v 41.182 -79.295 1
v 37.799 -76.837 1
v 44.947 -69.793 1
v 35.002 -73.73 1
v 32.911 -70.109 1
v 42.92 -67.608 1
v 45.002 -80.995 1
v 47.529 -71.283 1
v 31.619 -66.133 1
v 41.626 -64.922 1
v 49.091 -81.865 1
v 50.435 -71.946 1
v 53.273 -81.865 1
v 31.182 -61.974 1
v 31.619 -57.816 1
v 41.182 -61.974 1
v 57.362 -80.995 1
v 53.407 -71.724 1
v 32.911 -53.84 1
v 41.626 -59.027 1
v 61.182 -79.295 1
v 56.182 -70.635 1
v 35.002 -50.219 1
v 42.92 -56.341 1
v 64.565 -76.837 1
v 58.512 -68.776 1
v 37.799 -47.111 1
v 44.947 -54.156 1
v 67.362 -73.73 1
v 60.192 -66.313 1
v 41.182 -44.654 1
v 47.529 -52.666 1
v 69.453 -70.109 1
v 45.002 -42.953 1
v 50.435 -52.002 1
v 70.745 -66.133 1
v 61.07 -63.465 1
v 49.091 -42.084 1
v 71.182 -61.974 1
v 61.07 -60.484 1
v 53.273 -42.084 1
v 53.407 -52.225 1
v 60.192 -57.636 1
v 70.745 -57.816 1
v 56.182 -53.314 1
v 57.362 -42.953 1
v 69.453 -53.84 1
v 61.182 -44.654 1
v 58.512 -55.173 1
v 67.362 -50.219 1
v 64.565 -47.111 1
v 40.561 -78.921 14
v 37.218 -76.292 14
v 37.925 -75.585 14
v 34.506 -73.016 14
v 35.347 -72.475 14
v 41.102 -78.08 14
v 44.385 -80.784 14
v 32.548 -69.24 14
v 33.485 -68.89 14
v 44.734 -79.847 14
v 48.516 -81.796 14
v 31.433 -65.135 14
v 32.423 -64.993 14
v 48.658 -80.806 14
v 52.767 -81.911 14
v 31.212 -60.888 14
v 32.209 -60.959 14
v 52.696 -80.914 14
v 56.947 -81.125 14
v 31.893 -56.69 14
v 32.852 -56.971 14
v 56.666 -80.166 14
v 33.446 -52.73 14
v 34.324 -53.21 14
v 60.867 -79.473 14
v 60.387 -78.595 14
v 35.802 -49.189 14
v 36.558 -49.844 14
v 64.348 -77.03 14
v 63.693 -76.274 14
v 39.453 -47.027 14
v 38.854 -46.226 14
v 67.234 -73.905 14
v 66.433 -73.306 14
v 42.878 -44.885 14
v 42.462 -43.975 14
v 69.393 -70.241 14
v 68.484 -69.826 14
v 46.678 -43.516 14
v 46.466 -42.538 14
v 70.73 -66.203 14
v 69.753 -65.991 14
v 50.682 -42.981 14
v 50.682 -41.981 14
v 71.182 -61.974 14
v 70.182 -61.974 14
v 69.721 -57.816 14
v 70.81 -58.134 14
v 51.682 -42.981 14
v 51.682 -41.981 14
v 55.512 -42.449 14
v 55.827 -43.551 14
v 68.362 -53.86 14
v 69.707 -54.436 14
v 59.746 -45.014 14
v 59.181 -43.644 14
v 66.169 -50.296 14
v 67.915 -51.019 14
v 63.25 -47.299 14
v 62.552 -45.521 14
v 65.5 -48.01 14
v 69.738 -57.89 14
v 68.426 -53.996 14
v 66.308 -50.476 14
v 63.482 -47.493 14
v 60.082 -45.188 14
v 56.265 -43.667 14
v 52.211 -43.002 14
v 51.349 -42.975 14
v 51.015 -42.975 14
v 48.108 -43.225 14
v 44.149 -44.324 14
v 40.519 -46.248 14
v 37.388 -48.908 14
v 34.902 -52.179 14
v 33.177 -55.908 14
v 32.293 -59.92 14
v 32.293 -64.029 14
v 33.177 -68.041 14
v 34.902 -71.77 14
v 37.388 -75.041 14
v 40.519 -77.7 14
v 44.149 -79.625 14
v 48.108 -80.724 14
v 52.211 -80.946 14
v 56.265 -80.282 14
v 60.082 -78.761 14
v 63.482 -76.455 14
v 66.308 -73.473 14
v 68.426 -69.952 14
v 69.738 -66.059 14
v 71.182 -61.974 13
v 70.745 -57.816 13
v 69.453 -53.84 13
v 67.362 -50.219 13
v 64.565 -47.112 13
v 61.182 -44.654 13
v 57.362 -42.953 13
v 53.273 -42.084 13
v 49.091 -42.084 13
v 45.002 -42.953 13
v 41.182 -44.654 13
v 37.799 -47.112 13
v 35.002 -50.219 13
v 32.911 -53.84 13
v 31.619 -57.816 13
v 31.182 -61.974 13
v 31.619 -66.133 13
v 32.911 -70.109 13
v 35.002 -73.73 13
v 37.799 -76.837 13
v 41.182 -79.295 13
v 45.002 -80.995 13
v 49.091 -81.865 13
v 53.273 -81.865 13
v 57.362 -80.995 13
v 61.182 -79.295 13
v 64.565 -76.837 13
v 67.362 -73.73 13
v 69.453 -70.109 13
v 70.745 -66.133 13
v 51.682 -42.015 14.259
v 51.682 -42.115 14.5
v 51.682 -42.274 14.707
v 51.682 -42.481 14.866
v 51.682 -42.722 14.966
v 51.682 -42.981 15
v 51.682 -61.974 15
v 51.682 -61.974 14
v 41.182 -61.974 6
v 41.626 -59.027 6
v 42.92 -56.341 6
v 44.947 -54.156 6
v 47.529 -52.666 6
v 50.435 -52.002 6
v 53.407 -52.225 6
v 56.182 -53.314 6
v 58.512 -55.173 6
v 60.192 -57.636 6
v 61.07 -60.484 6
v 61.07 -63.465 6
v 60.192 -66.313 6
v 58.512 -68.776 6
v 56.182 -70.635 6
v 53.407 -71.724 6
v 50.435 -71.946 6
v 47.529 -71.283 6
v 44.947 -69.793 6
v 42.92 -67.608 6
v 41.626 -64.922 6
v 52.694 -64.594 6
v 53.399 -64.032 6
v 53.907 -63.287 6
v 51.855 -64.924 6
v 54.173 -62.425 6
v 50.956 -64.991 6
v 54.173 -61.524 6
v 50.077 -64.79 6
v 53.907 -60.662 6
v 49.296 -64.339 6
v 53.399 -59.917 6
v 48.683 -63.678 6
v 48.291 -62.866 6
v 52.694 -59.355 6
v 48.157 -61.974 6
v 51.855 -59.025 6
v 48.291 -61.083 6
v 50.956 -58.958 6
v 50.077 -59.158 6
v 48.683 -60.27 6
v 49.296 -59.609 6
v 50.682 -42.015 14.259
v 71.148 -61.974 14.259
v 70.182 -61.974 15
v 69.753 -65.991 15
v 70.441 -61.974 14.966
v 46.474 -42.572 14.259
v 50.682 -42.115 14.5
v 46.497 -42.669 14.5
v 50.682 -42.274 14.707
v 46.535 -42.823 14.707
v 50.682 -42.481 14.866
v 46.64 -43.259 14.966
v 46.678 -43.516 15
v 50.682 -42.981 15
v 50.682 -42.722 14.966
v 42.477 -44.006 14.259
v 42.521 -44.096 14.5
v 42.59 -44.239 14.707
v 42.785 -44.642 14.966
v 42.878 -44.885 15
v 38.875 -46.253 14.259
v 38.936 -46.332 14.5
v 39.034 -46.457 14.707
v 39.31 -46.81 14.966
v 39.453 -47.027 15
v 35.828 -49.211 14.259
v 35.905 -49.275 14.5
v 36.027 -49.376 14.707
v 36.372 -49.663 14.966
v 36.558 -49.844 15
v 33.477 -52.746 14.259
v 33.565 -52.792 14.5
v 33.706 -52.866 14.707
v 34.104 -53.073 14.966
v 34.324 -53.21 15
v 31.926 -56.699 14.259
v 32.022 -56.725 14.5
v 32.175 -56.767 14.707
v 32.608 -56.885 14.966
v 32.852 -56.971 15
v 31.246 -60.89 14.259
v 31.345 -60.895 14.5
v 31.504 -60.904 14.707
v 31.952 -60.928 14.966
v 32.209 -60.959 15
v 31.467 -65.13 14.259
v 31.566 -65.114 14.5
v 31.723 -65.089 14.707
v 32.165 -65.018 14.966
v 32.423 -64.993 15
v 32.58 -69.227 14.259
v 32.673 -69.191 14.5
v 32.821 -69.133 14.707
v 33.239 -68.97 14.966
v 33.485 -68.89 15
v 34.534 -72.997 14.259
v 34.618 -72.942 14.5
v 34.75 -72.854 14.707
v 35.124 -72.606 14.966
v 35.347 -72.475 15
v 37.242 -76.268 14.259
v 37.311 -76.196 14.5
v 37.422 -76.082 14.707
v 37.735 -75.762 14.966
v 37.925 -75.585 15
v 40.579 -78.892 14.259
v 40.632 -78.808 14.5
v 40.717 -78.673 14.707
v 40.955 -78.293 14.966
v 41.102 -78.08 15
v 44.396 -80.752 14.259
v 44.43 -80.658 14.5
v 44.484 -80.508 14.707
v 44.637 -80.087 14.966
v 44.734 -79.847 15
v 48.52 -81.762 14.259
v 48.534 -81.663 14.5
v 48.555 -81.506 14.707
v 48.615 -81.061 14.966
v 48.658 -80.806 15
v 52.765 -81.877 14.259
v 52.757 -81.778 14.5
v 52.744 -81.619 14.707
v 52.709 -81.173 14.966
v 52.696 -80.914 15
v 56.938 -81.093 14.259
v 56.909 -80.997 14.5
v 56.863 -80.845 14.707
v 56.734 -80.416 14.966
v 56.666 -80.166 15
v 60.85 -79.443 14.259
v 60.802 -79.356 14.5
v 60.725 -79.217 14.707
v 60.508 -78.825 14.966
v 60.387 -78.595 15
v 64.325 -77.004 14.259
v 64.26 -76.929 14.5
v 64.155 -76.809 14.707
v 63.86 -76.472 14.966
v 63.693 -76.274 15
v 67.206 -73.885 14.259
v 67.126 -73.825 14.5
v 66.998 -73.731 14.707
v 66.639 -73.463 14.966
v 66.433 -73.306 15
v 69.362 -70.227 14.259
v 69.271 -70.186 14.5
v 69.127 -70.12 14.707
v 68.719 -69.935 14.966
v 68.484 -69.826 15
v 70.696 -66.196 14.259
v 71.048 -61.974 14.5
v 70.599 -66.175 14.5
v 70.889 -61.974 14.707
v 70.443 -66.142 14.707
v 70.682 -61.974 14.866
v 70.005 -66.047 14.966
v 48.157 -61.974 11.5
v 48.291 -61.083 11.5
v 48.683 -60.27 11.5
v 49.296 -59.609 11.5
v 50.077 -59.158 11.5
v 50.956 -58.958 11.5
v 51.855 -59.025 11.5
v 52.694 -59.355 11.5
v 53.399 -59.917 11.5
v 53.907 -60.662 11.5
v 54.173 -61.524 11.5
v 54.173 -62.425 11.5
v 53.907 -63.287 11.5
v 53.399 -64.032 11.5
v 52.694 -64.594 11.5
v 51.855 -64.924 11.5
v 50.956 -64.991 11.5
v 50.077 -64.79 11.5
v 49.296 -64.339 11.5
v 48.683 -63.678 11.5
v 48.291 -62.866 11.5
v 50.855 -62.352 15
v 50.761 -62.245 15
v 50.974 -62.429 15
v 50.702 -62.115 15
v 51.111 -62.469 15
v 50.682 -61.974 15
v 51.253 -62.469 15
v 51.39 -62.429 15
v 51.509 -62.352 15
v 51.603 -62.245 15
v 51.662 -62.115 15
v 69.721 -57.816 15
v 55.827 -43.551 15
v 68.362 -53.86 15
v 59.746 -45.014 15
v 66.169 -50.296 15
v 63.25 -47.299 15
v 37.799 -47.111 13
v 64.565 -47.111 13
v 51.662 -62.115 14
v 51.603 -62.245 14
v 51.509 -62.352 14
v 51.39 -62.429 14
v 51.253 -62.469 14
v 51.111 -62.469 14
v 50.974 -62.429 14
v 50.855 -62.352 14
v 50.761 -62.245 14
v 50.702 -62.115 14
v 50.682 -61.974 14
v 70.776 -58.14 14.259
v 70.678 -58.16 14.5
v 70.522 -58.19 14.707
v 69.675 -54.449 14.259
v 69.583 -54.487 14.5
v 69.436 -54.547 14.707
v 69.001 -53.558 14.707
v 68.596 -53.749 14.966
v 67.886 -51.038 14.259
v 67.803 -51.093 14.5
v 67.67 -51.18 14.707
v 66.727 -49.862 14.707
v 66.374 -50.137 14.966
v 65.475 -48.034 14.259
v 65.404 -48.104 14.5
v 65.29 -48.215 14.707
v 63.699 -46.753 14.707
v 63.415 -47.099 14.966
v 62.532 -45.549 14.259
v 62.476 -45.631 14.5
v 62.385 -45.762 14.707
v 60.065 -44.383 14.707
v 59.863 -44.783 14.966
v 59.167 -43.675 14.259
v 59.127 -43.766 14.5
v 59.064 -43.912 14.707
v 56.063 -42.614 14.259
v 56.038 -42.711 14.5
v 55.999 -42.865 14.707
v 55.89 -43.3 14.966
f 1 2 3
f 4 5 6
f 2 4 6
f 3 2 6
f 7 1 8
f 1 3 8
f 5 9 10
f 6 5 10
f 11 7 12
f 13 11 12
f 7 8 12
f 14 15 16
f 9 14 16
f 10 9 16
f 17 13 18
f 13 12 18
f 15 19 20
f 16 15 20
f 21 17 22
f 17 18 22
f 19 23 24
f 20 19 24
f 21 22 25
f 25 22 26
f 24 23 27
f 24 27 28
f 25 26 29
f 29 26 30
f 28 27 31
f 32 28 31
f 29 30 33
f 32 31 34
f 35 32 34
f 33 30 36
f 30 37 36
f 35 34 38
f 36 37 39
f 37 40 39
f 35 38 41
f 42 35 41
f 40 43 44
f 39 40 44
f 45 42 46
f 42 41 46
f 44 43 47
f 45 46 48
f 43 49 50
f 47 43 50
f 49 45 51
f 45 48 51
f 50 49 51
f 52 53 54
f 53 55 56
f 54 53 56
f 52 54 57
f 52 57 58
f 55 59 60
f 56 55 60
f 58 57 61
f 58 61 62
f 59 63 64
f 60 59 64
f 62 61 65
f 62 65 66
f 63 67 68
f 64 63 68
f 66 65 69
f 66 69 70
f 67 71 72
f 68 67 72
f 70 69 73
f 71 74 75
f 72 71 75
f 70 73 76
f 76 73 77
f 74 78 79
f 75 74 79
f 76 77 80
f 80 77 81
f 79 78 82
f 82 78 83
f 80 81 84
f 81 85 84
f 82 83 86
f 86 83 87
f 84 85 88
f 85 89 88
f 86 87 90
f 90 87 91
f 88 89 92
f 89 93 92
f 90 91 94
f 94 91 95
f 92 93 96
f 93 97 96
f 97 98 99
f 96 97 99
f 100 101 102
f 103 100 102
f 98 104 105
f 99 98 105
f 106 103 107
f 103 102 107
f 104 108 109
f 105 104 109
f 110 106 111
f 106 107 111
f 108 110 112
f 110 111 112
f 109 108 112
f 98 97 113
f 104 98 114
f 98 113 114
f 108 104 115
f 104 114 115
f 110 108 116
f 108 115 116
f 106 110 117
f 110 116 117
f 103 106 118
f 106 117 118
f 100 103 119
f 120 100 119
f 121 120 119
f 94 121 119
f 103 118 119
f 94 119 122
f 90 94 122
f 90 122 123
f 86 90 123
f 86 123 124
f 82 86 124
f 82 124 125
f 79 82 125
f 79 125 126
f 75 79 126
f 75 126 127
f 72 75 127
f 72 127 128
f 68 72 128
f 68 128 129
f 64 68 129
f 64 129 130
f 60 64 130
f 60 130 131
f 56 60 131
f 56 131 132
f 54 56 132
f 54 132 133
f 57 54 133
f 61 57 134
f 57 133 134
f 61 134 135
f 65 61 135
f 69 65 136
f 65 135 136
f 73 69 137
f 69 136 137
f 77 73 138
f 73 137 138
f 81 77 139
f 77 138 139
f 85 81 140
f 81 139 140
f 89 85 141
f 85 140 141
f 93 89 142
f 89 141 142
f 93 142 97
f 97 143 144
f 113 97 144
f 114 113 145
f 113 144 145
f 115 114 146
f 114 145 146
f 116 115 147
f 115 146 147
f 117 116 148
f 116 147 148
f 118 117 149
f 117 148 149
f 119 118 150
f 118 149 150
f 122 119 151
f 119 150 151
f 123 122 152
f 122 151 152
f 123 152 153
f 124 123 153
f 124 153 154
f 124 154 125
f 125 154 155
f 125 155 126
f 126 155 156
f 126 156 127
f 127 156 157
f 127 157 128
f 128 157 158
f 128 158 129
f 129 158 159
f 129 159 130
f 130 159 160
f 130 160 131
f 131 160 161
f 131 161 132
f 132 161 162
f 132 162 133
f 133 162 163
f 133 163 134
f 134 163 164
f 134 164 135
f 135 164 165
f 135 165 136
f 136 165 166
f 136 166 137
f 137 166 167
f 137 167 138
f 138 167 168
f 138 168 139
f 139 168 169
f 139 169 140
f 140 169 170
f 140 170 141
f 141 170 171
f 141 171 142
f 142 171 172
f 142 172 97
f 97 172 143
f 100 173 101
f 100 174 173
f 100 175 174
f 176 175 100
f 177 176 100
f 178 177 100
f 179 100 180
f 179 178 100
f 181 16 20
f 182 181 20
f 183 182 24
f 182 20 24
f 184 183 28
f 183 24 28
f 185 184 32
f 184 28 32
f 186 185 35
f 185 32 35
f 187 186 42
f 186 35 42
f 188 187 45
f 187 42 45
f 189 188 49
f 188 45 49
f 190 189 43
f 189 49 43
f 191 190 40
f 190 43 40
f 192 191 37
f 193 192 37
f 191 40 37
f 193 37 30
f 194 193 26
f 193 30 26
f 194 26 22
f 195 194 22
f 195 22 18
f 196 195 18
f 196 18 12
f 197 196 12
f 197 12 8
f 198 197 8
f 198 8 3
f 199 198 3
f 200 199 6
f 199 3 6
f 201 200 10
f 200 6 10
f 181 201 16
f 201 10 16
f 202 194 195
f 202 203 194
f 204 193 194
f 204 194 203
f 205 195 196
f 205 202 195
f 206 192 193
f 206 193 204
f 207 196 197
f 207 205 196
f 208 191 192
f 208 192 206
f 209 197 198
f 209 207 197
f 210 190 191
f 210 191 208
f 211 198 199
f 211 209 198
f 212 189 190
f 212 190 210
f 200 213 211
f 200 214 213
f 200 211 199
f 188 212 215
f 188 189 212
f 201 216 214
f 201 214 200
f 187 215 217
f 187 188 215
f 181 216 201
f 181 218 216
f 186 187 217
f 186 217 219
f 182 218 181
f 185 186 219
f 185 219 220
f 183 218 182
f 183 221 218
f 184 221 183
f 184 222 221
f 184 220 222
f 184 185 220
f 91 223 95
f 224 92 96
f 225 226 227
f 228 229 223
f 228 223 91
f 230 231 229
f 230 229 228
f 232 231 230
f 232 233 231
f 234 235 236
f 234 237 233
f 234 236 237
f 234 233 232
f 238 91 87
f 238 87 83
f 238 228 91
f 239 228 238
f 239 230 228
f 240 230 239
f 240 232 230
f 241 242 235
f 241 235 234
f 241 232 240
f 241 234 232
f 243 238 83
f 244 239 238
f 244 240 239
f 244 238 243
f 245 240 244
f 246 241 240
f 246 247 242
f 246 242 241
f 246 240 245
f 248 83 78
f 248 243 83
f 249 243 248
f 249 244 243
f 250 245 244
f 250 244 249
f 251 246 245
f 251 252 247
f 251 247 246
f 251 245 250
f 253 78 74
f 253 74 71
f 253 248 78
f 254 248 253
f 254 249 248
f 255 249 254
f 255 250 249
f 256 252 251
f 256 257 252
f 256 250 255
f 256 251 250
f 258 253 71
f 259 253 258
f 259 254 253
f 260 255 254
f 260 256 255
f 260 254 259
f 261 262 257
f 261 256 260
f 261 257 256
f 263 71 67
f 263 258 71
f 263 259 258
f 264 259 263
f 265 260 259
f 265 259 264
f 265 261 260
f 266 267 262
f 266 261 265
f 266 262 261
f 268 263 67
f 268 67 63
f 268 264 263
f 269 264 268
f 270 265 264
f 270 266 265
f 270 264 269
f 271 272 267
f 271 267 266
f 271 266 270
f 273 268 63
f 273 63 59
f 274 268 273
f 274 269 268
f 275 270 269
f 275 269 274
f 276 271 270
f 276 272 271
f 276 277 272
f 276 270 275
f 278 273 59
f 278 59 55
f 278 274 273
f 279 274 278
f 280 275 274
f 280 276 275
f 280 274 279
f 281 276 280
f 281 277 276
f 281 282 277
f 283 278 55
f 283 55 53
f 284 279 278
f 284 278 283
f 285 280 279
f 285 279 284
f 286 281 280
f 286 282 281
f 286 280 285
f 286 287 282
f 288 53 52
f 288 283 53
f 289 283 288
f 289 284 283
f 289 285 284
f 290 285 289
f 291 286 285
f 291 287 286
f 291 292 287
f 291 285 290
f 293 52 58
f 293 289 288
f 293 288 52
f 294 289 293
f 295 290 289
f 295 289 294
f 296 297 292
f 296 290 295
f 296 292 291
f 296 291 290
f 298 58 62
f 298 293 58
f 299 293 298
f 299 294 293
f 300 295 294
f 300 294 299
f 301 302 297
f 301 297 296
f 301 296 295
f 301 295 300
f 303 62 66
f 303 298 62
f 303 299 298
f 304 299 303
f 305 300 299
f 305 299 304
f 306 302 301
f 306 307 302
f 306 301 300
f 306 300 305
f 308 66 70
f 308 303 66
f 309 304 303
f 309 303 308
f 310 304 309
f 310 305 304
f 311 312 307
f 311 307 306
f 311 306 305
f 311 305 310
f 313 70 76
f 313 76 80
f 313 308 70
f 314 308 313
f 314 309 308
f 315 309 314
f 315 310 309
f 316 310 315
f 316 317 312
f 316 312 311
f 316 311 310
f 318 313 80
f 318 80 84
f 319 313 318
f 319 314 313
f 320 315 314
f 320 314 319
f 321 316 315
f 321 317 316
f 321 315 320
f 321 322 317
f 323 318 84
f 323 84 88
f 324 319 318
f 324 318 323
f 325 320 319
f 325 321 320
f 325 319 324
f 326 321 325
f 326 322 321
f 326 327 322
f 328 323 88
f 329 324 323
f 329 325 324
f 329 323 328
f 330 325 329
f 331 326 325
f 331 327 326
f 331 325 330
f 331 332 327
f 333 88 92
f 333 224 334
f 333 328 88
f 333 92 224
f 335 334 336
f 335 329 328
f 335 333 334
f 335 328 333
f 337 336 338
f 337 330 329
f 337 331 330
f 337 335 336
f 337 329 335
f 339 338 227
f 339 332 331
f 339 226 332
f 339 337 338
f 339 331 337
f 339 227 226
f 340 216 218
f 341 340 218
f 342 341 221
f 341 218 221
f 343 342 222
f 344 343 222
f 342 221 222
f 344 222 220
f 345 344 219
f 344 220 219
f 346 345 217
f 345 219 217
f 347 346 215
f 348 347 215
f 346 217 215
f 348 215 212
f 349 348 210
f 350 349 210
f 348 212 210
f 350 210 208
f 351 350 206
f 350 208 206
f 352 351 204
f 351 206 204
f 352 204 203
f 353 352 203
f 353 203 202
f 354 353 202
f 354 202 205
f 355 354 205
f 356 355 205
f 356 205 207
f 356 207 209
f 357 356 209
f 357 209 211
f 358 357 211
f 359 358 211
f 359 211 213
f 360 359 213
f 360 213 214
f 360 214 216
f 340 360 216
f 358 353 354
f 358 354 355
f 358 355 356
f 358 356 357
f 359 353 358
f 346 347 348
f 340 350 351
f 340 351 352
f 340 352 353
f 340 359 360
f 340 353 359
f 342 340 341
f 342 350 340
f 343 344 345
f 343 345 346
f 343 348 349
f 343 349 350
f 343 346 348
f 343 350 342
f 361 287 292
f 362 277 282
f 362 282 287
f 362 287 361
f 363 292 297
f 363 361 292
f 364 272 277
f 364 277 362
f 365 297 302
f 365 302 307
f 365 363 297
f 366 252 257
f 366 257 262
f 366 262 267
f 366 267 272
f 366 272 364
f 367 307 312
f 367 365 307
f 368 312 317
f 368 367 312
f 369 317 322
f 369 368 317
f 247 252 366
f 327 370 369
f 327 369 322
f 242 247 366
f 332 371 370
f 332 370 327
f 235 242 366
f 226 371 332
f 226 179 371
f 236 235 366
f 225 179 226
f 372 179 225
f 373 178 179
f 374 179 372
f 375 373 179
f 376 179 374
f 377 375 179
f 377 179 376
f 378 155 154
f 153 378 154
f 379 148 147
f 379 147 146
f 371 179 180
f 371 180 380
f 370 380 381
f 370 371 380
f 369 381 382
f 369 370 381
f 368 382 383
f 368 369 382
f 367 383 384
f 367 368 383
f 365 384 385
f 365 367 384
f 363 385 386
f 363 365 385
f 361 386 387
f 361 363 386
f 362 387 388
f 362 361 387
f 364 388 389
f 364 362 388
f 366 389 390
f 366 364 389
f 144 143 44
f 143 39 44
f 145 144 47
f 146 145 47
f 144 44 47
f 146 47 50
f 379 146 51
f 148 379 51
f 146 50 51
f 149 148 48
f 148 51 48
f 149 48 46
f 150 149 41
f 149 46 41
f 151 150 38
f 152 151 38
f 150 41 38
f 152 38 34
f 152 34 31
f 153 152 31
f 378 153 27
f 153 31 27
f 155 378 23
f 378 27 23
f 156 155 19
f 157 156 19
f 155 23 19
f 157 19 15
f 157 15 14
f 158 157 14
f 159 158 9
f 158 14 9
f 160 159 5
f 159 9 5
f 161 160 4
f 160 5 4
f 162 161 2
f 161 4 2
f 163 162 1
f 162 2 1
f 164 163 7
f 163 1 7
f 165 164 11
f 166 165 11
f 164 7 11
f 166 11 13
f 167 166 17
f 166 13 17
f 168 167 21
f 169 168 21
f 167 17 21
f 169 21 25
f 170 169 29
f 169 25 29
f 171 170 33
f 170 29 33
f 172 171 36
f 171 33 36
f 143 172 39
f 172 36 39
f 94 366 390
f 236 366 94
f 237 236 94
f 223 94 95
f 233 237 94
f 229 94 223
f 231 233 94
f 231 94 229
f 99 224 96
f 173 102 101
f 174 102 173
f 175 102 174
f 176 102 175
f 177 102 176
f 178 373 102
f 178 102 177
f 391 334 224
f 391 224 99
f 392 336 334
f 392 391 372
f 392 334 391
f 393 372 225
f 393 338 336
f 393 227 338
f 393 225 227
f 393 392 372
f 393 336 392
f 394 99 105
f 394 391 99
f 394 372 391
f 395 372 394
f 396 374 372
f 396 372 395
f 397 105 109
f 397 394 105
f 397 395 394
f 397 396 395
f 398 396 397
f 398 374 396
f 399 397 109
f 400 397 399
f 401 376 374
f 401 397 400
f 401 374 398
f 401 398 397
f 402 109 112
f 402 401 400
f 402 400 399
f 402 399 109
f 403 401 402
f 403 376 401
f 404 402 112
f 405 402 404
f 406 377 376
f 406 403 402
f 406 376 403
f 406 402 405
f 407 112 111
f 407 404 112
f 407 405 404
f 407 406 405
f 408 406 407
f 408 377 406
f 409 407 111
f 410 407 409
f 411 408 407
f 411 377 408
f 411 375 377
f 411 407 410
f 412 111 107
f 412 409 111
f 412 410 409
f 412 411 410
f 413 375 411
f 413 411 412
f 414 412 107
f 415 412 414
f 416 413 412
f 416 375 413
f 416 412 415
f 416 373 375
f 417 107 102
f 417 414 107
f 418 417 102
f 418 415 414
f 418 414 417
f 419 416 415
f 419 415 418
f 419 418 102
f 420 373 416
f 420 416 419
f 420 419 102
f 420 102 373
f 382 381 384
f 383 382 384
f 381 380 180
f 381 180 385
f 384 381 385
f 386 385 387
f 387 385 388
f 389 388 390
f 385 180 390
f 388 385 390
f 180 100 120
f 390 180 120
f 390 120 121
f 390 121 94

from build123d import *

# Parameters (mm, degrees)
BOSS_EXTRUDE1_START = 1
SKETCH1_R           = 20
BOSS_EXTRUDE1_DEPTH = 14
FILLET2_R           = 1
CUT_EXTRUDE1_DEPTH  = 1
CUT_EXTRUDE2_START  = -2
SKETCH4_R           = 20
SKETCH4_R_2         = 19
CUT_EXTRUDE2_DEPTH  = 1
CHAMFER1_SIZE       = 1
SKETCH5_R           = 3.025
CUT_EXTRUDE3_DEPTH  = 10.5
SKETCH6_R           = 10
CUT_EXTRUDE4_DEPTH  = 5


with BuildPart() as part:
    # Sketch1 → Boss-Extrude1 (new body)
    with BuildSketch(Plane.XY.offset(BOSS_EXTRUDE1_START)):
        with Locations((51.181970815, -61.974353767)):
            Circle(SKETCH1_R)
    extrude(amount=BOSS_EXTRUDE1_DEPTH)

    # Fillet2
    fillet2_edges = [part.edges().sort_by_distance(p)[0] for p in [
        (31.181970815, -61.974353767, 15),
    ]]
    fillet(fillet2_edges, radius=FILLET2_R)

    # Sketch3 → Cut-Extrude1 (cut)
    with BuildSketch(Plane.XY.offset(15)):
        with BuildLine():
            Line((50.681970815, -61.974353767), (50.681970815, -41.974353767))
            ThreePointArc((50.681970815, -41.974353767), (51.181970815, -41.474353767), (51.681970815, -41.974353767))
            Line((51.681970815, -41.974353767), (51.681970815, -61.974353767))
            ThreePointArc((51.681970815, -61.974353767), (51.181970815, -62.474353767), (50.681970815, -61.974353767))
        make_face()
    extrude(amount=-CUT_EXTRUDE1_DEPTH, mode=Mode.SUBTRACT)

    # Sketch4 → Cut-Extrude2 (cut)
    with BuildSketch(Plane.XY.offset(15).offset(CUT_EXTRUDE2_START)):
        with Locations((51.181970815, -61.974353767)):
            Circle(SKETCH4_R)
        with Locations((51.181970815, -61.974353767)):
            Circle(SKETCH4_R_2, mode=Mode.SUBTRACT)
    extrude(amount=CUT_EXTRUDE2_DEPTH, mode=Mode.SUBTRACT)

    # Chamfer1
    chamfer1_edges = [part.edges().sort_by_distance(p)[0] for p in [
        (32.181970815, -61.974353767, 13),
    ]]
    chamfer(chamfer1_edges, length=CHAMFER1_SIZE - 0.0001)  # a hair under: the kernel refuses the full size

    # Sketch5 → Cut-Extrude3 (cut)
    with BuildSketch(Plane(origin=(0, 0, 1), x_dir=(-1, 0, 0), z_dir=(0, 0, -1))):
        with Locations((-51.181970815, -61.974353767)):
            Circle(SKETCH5_R)
    extrude(amount=-CUT_EXTRUDE3_DEPTH, mode=Mode.SUBTRACT)

    # Sketch6 → Cut-Extrude4 (cut)
    with BuildSketch(Plane(origin=(0, 0, 1), x_dir=(-1, 0, 0), z_dir=(0, 0, -1))):
        with Locations((-51.181970815, -61.974353767)):
            Circle(SKETCH6_R)
    extrude(amount=-CUT_EXTRUDE4_DEPTH, mode=Mode.SUBTRACT)


solid = part.part
